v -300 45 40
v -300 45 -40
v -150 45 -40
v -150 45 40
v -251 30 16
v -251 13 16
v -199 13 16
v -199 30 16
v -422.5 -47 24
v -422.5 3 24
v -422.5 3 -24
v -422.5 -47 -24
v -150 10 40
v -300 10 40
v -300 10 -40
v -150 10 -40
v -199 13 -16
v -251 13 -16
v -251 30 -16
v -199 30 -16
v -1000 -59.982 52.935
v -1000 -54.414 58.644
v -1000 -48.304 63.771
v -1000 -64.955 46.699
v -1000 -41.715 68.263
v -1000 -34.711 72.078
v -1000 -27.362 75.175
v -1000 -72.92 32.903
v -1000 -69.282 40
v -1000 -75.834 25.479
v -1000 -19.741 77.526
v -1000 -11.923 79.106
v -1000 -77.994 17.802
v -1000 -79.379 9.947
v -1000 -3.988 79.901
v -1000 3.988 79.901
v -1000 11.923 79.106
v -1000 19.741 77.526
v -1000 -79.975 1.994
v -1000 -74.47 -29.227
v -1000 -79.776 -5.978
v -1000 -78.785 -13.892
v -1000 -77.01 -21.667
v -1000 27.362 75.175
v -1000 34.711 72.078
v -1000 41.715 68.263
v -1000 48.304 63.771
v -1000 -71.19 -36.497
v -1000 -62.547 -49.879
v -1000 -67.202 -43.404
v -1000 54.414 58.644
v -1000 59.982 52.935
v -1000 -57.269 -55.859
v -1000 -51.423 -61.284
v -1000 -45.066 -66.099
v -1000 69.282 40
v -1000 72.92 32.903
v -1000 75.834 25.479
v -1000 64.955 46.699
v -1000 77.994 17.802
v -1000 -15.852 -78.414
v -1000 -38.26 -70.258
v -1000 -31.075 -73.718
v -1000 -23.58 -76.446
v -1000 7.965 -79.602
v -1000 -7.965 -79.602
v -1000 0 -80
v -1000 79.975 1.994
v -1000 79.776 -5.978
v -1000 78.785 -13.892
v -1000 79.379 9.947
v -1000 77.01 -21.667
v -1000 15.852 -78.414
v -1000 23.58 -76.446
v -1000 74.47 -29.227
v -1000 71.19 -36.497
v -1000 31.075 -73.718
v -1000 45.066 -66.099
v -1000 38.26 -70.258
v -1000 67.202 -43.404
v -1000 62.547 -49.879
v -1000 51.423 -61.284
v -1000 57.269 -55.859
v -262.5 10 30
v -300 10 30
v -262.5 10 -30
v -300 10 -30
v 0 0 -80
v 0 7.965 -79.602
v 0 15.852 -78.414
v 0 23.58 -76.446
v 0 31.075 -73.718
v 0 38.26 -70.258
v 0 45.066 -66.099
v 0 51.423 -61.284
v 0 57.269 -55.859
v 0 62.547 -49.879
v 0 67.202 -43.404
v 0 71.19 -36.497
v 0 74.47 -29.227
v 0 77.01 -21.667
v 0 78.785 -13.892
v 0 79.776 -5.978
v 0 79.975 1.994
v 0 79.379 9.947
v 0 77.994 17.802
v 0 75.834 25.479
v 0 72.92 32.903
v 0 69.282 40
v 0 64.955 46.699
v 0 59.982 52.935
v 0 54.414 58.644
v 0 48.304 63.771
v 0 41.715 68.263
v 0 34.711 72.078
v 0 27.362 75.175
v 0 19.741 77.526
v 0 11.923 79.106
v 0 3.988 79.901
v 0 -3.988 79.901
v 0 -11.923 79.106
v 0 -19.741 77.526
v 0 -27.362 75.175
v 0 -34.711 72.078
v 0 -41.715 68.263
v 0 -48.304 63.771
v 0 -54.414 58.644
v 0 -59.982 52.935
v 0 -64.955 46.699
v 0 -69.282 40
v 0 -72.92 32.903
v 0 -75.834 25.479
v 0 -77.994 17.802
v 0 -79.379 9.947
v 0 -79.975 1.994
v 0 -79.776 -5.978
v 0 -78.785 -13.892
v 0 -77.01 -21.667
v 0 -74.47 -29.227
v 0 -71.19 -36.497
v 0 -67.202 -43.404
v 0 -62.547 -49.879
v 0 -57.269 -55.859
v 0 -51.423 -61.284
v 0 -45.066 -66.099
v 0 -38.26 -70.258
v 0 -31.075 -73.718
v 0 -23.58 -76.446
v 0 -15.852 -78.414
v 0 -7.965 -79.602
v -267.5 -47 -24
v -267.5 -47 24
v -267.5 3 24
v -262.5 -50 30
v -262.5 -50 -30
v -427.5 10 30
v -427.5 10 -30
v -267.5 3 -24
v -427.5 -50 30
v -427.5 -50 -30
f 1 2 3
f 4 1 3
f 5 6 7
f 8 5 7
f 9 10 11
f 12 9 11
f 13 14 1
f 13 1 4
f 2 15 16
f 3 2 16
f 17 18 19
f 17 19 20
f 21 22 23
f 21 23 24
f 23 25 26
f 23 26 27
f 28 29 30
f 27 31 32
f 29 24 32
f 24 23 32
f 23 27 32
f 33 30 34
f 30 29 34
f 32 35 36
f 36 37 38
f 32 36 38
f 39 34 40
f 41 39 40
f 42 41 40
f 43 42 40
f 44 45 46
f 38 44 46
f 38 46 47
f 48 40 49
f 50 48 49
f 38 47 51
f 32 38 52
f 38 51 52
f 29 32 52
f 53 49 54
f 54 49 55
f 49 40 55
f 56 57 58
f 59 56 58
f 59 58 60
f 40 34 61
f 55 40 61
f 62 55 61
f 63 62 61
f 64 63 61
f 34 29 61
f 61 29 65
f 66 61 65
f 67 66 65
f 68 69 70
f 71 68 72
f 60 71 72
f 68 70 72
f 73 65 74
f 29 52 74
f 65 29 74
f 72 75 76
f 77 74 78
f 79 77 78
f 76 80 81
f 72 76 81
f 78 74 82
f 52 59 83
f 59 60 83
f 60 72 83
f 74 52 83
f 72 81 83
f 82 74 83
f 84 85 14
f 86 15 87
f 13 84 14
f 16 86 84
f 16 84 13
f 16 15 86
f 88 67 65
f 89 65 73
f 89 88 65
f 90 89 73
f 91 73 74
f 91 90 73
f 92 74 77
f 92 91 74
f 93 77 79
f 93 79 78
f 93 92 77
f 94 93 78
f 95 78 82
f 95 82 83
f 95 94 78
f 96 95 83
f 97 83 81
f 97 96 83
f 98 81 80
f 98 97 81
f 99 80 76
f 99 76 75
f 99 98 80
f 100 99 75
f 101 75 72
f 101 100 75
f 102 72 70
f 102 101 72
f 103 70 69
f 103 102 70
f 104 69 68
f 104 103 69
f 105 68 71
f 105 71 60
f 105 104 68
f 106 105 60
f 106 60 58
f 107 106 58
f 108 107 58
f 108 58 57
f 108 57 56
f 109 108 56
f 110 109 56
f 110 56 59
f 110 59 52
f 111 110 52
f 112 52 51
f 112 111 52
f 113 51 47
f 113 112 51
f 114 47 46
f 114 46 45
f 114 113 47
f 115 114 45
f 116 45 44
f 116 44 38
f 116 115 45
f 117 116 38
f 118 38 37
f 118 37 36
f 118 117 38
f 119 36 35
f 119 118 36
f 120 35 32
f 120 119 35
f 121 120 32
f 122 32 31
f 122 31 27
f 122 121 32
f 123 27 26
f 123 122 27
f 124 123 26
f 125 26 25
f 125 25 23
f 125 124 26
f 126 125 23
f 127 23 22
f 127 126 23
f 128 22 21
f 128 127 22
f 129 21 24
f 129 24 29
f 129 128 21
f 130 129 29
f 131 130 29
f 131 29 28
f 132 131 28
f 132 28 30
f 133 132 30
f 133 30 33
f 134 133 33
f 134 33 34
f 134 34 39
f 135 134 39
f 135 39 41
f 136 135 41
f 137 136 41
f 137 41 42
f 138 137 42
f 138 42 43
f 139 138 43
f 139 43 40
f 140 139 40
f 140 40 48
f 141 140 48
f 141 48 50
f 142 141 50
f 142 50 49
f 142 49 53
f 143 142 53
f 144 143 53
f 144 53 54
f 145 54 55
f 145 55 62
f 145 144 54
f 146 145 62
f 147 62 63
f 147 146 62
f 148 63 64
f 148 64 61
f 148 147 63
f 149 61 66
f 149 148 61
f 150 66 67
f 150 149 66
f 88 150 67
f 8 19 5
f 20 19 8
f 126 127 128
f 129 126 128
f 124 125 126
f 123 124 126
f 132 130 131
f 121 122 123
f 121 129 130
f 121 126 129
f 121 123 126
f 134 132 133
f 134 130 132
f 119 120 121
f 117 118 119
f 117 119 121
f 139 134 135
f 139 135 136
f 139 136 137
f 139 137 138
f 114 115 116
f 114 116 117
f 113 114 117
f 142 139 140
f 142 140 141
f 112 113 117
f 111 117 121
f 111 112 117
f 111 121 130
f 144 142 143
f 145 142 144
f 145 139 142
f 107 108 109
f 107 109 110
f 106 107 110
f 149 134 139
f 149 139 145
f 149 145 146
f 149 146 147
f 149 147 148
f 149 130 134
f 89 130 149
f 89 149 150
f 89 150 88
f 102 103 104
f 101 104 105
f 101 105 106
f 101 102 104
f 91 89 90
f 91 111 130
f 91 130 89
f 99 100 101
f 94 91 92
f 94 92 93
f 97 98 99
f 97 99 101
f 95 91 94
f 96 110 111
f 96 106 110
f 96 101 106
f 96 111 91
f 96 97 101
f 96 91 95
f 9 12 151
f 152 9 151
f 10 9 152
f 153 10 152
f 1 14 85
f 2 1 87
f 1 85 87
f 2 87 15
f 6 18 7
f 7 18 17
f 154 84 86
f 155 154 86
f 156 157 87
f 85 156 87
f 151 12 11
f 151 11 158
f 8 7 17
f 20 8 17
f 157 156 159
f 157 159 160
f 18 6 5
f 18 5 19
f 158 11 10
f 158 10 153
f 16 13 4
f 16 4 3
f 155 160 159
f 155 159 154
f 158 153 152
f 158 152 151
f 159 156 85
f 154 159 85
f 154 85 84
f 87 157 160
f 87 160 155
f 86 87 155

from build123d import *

# Parameters (mm, degrees)
SKETCH1_R          = 80
FOAMBODY_DEPTH     = 1000
BATTERY_START      = 10
SKETCH2_W          = 165
SKETCH2_H          = 60
BATTERY_BAY_DEPTH  = 60
FOAM_START         = 10
SKETCH3_W          = 150
SKETCH3_H          = 80
FOAM_DEPTH         = 35
BATTERY_DEPTH      = 3
BATTERY_DEPTH_BACK = 47
SKETCH4_W          = 155
SKETCH4_H          = 48
FC_START           = 13
SKETCH5_W          = 52
SKETCH5_H          = 32
FC_DEPTH           = 17


with BuildPart() as part:
    # Sketch1 → FoamBody (new body)
    with BuildSketch(Plane(origin=(0, 0, 0), x_dir=(0, 0, -1), z_dir=(1, 0, 0))):
        Circle(SKETCH1_R)
    extrude(amount=-FOAMBODY_DEPTH)

    # Sketch2 → battery bay (cut)
    with BuildSketch(Plane(origin=(0, 0, 0), x_dir=(1, 0, 0), z_dir=(0, 1, 0)).offset(BATTERY_START)):
        with Locations((-345, 0)):
            Rectangle(SKETCH2_W, SKETCH2_H)
    extrude(amount=-BATTERY_BAY_DEPTH, mode=Mode.SUBTRACT)

    # Sketch3 → Foam (cut)
    with BuildSketch(Plane(origin=(0, 0, 0), x_dir=(1, 0, 0), z_dir=(0, 1, 0)).offset(FOAM_START)):
        with Locations((-225, 0)):
            Rectangle(SKETCH3_W, SKETCH3_H)
    extrude(amount=FOAM_DEPTH, mode=Mode.SUBTRACT)


with BuildPart() as body_2:
    # Sketch4 → Battery (new, two sides: drawn at the far end of the back side and taken through both)
    with BuildSketch(Plane(origin=(0, 0, 0), x_dir=(1, 0, 0), z_dir=(0, 1, 0)).offset(-BATTERY_DEPTH_BACK)):
        with Locations((-345, 0)):
            Rectangle(SKETCH4_W, SKETCH4_H)
    extrude(amount=BATTERY_DEPTH + BATTERY_DEPTH_BACK)


with BuildPart() as body_3:
    # Sketch5 → FC (new body)
    with BuildSketch(Plane(origin=(0, 0, 0), x_dir=(1, 0, 0), z_dir=(0, 1, 0)).offset(FC_START)):
        with Locations((-225, 0)):
            Rectangle(SKETCH5_W, SKETCH5_H)
    extrude(amount=FC_DEPTH)


solid = Compound([part.part, body_2.part, body_3.part])
